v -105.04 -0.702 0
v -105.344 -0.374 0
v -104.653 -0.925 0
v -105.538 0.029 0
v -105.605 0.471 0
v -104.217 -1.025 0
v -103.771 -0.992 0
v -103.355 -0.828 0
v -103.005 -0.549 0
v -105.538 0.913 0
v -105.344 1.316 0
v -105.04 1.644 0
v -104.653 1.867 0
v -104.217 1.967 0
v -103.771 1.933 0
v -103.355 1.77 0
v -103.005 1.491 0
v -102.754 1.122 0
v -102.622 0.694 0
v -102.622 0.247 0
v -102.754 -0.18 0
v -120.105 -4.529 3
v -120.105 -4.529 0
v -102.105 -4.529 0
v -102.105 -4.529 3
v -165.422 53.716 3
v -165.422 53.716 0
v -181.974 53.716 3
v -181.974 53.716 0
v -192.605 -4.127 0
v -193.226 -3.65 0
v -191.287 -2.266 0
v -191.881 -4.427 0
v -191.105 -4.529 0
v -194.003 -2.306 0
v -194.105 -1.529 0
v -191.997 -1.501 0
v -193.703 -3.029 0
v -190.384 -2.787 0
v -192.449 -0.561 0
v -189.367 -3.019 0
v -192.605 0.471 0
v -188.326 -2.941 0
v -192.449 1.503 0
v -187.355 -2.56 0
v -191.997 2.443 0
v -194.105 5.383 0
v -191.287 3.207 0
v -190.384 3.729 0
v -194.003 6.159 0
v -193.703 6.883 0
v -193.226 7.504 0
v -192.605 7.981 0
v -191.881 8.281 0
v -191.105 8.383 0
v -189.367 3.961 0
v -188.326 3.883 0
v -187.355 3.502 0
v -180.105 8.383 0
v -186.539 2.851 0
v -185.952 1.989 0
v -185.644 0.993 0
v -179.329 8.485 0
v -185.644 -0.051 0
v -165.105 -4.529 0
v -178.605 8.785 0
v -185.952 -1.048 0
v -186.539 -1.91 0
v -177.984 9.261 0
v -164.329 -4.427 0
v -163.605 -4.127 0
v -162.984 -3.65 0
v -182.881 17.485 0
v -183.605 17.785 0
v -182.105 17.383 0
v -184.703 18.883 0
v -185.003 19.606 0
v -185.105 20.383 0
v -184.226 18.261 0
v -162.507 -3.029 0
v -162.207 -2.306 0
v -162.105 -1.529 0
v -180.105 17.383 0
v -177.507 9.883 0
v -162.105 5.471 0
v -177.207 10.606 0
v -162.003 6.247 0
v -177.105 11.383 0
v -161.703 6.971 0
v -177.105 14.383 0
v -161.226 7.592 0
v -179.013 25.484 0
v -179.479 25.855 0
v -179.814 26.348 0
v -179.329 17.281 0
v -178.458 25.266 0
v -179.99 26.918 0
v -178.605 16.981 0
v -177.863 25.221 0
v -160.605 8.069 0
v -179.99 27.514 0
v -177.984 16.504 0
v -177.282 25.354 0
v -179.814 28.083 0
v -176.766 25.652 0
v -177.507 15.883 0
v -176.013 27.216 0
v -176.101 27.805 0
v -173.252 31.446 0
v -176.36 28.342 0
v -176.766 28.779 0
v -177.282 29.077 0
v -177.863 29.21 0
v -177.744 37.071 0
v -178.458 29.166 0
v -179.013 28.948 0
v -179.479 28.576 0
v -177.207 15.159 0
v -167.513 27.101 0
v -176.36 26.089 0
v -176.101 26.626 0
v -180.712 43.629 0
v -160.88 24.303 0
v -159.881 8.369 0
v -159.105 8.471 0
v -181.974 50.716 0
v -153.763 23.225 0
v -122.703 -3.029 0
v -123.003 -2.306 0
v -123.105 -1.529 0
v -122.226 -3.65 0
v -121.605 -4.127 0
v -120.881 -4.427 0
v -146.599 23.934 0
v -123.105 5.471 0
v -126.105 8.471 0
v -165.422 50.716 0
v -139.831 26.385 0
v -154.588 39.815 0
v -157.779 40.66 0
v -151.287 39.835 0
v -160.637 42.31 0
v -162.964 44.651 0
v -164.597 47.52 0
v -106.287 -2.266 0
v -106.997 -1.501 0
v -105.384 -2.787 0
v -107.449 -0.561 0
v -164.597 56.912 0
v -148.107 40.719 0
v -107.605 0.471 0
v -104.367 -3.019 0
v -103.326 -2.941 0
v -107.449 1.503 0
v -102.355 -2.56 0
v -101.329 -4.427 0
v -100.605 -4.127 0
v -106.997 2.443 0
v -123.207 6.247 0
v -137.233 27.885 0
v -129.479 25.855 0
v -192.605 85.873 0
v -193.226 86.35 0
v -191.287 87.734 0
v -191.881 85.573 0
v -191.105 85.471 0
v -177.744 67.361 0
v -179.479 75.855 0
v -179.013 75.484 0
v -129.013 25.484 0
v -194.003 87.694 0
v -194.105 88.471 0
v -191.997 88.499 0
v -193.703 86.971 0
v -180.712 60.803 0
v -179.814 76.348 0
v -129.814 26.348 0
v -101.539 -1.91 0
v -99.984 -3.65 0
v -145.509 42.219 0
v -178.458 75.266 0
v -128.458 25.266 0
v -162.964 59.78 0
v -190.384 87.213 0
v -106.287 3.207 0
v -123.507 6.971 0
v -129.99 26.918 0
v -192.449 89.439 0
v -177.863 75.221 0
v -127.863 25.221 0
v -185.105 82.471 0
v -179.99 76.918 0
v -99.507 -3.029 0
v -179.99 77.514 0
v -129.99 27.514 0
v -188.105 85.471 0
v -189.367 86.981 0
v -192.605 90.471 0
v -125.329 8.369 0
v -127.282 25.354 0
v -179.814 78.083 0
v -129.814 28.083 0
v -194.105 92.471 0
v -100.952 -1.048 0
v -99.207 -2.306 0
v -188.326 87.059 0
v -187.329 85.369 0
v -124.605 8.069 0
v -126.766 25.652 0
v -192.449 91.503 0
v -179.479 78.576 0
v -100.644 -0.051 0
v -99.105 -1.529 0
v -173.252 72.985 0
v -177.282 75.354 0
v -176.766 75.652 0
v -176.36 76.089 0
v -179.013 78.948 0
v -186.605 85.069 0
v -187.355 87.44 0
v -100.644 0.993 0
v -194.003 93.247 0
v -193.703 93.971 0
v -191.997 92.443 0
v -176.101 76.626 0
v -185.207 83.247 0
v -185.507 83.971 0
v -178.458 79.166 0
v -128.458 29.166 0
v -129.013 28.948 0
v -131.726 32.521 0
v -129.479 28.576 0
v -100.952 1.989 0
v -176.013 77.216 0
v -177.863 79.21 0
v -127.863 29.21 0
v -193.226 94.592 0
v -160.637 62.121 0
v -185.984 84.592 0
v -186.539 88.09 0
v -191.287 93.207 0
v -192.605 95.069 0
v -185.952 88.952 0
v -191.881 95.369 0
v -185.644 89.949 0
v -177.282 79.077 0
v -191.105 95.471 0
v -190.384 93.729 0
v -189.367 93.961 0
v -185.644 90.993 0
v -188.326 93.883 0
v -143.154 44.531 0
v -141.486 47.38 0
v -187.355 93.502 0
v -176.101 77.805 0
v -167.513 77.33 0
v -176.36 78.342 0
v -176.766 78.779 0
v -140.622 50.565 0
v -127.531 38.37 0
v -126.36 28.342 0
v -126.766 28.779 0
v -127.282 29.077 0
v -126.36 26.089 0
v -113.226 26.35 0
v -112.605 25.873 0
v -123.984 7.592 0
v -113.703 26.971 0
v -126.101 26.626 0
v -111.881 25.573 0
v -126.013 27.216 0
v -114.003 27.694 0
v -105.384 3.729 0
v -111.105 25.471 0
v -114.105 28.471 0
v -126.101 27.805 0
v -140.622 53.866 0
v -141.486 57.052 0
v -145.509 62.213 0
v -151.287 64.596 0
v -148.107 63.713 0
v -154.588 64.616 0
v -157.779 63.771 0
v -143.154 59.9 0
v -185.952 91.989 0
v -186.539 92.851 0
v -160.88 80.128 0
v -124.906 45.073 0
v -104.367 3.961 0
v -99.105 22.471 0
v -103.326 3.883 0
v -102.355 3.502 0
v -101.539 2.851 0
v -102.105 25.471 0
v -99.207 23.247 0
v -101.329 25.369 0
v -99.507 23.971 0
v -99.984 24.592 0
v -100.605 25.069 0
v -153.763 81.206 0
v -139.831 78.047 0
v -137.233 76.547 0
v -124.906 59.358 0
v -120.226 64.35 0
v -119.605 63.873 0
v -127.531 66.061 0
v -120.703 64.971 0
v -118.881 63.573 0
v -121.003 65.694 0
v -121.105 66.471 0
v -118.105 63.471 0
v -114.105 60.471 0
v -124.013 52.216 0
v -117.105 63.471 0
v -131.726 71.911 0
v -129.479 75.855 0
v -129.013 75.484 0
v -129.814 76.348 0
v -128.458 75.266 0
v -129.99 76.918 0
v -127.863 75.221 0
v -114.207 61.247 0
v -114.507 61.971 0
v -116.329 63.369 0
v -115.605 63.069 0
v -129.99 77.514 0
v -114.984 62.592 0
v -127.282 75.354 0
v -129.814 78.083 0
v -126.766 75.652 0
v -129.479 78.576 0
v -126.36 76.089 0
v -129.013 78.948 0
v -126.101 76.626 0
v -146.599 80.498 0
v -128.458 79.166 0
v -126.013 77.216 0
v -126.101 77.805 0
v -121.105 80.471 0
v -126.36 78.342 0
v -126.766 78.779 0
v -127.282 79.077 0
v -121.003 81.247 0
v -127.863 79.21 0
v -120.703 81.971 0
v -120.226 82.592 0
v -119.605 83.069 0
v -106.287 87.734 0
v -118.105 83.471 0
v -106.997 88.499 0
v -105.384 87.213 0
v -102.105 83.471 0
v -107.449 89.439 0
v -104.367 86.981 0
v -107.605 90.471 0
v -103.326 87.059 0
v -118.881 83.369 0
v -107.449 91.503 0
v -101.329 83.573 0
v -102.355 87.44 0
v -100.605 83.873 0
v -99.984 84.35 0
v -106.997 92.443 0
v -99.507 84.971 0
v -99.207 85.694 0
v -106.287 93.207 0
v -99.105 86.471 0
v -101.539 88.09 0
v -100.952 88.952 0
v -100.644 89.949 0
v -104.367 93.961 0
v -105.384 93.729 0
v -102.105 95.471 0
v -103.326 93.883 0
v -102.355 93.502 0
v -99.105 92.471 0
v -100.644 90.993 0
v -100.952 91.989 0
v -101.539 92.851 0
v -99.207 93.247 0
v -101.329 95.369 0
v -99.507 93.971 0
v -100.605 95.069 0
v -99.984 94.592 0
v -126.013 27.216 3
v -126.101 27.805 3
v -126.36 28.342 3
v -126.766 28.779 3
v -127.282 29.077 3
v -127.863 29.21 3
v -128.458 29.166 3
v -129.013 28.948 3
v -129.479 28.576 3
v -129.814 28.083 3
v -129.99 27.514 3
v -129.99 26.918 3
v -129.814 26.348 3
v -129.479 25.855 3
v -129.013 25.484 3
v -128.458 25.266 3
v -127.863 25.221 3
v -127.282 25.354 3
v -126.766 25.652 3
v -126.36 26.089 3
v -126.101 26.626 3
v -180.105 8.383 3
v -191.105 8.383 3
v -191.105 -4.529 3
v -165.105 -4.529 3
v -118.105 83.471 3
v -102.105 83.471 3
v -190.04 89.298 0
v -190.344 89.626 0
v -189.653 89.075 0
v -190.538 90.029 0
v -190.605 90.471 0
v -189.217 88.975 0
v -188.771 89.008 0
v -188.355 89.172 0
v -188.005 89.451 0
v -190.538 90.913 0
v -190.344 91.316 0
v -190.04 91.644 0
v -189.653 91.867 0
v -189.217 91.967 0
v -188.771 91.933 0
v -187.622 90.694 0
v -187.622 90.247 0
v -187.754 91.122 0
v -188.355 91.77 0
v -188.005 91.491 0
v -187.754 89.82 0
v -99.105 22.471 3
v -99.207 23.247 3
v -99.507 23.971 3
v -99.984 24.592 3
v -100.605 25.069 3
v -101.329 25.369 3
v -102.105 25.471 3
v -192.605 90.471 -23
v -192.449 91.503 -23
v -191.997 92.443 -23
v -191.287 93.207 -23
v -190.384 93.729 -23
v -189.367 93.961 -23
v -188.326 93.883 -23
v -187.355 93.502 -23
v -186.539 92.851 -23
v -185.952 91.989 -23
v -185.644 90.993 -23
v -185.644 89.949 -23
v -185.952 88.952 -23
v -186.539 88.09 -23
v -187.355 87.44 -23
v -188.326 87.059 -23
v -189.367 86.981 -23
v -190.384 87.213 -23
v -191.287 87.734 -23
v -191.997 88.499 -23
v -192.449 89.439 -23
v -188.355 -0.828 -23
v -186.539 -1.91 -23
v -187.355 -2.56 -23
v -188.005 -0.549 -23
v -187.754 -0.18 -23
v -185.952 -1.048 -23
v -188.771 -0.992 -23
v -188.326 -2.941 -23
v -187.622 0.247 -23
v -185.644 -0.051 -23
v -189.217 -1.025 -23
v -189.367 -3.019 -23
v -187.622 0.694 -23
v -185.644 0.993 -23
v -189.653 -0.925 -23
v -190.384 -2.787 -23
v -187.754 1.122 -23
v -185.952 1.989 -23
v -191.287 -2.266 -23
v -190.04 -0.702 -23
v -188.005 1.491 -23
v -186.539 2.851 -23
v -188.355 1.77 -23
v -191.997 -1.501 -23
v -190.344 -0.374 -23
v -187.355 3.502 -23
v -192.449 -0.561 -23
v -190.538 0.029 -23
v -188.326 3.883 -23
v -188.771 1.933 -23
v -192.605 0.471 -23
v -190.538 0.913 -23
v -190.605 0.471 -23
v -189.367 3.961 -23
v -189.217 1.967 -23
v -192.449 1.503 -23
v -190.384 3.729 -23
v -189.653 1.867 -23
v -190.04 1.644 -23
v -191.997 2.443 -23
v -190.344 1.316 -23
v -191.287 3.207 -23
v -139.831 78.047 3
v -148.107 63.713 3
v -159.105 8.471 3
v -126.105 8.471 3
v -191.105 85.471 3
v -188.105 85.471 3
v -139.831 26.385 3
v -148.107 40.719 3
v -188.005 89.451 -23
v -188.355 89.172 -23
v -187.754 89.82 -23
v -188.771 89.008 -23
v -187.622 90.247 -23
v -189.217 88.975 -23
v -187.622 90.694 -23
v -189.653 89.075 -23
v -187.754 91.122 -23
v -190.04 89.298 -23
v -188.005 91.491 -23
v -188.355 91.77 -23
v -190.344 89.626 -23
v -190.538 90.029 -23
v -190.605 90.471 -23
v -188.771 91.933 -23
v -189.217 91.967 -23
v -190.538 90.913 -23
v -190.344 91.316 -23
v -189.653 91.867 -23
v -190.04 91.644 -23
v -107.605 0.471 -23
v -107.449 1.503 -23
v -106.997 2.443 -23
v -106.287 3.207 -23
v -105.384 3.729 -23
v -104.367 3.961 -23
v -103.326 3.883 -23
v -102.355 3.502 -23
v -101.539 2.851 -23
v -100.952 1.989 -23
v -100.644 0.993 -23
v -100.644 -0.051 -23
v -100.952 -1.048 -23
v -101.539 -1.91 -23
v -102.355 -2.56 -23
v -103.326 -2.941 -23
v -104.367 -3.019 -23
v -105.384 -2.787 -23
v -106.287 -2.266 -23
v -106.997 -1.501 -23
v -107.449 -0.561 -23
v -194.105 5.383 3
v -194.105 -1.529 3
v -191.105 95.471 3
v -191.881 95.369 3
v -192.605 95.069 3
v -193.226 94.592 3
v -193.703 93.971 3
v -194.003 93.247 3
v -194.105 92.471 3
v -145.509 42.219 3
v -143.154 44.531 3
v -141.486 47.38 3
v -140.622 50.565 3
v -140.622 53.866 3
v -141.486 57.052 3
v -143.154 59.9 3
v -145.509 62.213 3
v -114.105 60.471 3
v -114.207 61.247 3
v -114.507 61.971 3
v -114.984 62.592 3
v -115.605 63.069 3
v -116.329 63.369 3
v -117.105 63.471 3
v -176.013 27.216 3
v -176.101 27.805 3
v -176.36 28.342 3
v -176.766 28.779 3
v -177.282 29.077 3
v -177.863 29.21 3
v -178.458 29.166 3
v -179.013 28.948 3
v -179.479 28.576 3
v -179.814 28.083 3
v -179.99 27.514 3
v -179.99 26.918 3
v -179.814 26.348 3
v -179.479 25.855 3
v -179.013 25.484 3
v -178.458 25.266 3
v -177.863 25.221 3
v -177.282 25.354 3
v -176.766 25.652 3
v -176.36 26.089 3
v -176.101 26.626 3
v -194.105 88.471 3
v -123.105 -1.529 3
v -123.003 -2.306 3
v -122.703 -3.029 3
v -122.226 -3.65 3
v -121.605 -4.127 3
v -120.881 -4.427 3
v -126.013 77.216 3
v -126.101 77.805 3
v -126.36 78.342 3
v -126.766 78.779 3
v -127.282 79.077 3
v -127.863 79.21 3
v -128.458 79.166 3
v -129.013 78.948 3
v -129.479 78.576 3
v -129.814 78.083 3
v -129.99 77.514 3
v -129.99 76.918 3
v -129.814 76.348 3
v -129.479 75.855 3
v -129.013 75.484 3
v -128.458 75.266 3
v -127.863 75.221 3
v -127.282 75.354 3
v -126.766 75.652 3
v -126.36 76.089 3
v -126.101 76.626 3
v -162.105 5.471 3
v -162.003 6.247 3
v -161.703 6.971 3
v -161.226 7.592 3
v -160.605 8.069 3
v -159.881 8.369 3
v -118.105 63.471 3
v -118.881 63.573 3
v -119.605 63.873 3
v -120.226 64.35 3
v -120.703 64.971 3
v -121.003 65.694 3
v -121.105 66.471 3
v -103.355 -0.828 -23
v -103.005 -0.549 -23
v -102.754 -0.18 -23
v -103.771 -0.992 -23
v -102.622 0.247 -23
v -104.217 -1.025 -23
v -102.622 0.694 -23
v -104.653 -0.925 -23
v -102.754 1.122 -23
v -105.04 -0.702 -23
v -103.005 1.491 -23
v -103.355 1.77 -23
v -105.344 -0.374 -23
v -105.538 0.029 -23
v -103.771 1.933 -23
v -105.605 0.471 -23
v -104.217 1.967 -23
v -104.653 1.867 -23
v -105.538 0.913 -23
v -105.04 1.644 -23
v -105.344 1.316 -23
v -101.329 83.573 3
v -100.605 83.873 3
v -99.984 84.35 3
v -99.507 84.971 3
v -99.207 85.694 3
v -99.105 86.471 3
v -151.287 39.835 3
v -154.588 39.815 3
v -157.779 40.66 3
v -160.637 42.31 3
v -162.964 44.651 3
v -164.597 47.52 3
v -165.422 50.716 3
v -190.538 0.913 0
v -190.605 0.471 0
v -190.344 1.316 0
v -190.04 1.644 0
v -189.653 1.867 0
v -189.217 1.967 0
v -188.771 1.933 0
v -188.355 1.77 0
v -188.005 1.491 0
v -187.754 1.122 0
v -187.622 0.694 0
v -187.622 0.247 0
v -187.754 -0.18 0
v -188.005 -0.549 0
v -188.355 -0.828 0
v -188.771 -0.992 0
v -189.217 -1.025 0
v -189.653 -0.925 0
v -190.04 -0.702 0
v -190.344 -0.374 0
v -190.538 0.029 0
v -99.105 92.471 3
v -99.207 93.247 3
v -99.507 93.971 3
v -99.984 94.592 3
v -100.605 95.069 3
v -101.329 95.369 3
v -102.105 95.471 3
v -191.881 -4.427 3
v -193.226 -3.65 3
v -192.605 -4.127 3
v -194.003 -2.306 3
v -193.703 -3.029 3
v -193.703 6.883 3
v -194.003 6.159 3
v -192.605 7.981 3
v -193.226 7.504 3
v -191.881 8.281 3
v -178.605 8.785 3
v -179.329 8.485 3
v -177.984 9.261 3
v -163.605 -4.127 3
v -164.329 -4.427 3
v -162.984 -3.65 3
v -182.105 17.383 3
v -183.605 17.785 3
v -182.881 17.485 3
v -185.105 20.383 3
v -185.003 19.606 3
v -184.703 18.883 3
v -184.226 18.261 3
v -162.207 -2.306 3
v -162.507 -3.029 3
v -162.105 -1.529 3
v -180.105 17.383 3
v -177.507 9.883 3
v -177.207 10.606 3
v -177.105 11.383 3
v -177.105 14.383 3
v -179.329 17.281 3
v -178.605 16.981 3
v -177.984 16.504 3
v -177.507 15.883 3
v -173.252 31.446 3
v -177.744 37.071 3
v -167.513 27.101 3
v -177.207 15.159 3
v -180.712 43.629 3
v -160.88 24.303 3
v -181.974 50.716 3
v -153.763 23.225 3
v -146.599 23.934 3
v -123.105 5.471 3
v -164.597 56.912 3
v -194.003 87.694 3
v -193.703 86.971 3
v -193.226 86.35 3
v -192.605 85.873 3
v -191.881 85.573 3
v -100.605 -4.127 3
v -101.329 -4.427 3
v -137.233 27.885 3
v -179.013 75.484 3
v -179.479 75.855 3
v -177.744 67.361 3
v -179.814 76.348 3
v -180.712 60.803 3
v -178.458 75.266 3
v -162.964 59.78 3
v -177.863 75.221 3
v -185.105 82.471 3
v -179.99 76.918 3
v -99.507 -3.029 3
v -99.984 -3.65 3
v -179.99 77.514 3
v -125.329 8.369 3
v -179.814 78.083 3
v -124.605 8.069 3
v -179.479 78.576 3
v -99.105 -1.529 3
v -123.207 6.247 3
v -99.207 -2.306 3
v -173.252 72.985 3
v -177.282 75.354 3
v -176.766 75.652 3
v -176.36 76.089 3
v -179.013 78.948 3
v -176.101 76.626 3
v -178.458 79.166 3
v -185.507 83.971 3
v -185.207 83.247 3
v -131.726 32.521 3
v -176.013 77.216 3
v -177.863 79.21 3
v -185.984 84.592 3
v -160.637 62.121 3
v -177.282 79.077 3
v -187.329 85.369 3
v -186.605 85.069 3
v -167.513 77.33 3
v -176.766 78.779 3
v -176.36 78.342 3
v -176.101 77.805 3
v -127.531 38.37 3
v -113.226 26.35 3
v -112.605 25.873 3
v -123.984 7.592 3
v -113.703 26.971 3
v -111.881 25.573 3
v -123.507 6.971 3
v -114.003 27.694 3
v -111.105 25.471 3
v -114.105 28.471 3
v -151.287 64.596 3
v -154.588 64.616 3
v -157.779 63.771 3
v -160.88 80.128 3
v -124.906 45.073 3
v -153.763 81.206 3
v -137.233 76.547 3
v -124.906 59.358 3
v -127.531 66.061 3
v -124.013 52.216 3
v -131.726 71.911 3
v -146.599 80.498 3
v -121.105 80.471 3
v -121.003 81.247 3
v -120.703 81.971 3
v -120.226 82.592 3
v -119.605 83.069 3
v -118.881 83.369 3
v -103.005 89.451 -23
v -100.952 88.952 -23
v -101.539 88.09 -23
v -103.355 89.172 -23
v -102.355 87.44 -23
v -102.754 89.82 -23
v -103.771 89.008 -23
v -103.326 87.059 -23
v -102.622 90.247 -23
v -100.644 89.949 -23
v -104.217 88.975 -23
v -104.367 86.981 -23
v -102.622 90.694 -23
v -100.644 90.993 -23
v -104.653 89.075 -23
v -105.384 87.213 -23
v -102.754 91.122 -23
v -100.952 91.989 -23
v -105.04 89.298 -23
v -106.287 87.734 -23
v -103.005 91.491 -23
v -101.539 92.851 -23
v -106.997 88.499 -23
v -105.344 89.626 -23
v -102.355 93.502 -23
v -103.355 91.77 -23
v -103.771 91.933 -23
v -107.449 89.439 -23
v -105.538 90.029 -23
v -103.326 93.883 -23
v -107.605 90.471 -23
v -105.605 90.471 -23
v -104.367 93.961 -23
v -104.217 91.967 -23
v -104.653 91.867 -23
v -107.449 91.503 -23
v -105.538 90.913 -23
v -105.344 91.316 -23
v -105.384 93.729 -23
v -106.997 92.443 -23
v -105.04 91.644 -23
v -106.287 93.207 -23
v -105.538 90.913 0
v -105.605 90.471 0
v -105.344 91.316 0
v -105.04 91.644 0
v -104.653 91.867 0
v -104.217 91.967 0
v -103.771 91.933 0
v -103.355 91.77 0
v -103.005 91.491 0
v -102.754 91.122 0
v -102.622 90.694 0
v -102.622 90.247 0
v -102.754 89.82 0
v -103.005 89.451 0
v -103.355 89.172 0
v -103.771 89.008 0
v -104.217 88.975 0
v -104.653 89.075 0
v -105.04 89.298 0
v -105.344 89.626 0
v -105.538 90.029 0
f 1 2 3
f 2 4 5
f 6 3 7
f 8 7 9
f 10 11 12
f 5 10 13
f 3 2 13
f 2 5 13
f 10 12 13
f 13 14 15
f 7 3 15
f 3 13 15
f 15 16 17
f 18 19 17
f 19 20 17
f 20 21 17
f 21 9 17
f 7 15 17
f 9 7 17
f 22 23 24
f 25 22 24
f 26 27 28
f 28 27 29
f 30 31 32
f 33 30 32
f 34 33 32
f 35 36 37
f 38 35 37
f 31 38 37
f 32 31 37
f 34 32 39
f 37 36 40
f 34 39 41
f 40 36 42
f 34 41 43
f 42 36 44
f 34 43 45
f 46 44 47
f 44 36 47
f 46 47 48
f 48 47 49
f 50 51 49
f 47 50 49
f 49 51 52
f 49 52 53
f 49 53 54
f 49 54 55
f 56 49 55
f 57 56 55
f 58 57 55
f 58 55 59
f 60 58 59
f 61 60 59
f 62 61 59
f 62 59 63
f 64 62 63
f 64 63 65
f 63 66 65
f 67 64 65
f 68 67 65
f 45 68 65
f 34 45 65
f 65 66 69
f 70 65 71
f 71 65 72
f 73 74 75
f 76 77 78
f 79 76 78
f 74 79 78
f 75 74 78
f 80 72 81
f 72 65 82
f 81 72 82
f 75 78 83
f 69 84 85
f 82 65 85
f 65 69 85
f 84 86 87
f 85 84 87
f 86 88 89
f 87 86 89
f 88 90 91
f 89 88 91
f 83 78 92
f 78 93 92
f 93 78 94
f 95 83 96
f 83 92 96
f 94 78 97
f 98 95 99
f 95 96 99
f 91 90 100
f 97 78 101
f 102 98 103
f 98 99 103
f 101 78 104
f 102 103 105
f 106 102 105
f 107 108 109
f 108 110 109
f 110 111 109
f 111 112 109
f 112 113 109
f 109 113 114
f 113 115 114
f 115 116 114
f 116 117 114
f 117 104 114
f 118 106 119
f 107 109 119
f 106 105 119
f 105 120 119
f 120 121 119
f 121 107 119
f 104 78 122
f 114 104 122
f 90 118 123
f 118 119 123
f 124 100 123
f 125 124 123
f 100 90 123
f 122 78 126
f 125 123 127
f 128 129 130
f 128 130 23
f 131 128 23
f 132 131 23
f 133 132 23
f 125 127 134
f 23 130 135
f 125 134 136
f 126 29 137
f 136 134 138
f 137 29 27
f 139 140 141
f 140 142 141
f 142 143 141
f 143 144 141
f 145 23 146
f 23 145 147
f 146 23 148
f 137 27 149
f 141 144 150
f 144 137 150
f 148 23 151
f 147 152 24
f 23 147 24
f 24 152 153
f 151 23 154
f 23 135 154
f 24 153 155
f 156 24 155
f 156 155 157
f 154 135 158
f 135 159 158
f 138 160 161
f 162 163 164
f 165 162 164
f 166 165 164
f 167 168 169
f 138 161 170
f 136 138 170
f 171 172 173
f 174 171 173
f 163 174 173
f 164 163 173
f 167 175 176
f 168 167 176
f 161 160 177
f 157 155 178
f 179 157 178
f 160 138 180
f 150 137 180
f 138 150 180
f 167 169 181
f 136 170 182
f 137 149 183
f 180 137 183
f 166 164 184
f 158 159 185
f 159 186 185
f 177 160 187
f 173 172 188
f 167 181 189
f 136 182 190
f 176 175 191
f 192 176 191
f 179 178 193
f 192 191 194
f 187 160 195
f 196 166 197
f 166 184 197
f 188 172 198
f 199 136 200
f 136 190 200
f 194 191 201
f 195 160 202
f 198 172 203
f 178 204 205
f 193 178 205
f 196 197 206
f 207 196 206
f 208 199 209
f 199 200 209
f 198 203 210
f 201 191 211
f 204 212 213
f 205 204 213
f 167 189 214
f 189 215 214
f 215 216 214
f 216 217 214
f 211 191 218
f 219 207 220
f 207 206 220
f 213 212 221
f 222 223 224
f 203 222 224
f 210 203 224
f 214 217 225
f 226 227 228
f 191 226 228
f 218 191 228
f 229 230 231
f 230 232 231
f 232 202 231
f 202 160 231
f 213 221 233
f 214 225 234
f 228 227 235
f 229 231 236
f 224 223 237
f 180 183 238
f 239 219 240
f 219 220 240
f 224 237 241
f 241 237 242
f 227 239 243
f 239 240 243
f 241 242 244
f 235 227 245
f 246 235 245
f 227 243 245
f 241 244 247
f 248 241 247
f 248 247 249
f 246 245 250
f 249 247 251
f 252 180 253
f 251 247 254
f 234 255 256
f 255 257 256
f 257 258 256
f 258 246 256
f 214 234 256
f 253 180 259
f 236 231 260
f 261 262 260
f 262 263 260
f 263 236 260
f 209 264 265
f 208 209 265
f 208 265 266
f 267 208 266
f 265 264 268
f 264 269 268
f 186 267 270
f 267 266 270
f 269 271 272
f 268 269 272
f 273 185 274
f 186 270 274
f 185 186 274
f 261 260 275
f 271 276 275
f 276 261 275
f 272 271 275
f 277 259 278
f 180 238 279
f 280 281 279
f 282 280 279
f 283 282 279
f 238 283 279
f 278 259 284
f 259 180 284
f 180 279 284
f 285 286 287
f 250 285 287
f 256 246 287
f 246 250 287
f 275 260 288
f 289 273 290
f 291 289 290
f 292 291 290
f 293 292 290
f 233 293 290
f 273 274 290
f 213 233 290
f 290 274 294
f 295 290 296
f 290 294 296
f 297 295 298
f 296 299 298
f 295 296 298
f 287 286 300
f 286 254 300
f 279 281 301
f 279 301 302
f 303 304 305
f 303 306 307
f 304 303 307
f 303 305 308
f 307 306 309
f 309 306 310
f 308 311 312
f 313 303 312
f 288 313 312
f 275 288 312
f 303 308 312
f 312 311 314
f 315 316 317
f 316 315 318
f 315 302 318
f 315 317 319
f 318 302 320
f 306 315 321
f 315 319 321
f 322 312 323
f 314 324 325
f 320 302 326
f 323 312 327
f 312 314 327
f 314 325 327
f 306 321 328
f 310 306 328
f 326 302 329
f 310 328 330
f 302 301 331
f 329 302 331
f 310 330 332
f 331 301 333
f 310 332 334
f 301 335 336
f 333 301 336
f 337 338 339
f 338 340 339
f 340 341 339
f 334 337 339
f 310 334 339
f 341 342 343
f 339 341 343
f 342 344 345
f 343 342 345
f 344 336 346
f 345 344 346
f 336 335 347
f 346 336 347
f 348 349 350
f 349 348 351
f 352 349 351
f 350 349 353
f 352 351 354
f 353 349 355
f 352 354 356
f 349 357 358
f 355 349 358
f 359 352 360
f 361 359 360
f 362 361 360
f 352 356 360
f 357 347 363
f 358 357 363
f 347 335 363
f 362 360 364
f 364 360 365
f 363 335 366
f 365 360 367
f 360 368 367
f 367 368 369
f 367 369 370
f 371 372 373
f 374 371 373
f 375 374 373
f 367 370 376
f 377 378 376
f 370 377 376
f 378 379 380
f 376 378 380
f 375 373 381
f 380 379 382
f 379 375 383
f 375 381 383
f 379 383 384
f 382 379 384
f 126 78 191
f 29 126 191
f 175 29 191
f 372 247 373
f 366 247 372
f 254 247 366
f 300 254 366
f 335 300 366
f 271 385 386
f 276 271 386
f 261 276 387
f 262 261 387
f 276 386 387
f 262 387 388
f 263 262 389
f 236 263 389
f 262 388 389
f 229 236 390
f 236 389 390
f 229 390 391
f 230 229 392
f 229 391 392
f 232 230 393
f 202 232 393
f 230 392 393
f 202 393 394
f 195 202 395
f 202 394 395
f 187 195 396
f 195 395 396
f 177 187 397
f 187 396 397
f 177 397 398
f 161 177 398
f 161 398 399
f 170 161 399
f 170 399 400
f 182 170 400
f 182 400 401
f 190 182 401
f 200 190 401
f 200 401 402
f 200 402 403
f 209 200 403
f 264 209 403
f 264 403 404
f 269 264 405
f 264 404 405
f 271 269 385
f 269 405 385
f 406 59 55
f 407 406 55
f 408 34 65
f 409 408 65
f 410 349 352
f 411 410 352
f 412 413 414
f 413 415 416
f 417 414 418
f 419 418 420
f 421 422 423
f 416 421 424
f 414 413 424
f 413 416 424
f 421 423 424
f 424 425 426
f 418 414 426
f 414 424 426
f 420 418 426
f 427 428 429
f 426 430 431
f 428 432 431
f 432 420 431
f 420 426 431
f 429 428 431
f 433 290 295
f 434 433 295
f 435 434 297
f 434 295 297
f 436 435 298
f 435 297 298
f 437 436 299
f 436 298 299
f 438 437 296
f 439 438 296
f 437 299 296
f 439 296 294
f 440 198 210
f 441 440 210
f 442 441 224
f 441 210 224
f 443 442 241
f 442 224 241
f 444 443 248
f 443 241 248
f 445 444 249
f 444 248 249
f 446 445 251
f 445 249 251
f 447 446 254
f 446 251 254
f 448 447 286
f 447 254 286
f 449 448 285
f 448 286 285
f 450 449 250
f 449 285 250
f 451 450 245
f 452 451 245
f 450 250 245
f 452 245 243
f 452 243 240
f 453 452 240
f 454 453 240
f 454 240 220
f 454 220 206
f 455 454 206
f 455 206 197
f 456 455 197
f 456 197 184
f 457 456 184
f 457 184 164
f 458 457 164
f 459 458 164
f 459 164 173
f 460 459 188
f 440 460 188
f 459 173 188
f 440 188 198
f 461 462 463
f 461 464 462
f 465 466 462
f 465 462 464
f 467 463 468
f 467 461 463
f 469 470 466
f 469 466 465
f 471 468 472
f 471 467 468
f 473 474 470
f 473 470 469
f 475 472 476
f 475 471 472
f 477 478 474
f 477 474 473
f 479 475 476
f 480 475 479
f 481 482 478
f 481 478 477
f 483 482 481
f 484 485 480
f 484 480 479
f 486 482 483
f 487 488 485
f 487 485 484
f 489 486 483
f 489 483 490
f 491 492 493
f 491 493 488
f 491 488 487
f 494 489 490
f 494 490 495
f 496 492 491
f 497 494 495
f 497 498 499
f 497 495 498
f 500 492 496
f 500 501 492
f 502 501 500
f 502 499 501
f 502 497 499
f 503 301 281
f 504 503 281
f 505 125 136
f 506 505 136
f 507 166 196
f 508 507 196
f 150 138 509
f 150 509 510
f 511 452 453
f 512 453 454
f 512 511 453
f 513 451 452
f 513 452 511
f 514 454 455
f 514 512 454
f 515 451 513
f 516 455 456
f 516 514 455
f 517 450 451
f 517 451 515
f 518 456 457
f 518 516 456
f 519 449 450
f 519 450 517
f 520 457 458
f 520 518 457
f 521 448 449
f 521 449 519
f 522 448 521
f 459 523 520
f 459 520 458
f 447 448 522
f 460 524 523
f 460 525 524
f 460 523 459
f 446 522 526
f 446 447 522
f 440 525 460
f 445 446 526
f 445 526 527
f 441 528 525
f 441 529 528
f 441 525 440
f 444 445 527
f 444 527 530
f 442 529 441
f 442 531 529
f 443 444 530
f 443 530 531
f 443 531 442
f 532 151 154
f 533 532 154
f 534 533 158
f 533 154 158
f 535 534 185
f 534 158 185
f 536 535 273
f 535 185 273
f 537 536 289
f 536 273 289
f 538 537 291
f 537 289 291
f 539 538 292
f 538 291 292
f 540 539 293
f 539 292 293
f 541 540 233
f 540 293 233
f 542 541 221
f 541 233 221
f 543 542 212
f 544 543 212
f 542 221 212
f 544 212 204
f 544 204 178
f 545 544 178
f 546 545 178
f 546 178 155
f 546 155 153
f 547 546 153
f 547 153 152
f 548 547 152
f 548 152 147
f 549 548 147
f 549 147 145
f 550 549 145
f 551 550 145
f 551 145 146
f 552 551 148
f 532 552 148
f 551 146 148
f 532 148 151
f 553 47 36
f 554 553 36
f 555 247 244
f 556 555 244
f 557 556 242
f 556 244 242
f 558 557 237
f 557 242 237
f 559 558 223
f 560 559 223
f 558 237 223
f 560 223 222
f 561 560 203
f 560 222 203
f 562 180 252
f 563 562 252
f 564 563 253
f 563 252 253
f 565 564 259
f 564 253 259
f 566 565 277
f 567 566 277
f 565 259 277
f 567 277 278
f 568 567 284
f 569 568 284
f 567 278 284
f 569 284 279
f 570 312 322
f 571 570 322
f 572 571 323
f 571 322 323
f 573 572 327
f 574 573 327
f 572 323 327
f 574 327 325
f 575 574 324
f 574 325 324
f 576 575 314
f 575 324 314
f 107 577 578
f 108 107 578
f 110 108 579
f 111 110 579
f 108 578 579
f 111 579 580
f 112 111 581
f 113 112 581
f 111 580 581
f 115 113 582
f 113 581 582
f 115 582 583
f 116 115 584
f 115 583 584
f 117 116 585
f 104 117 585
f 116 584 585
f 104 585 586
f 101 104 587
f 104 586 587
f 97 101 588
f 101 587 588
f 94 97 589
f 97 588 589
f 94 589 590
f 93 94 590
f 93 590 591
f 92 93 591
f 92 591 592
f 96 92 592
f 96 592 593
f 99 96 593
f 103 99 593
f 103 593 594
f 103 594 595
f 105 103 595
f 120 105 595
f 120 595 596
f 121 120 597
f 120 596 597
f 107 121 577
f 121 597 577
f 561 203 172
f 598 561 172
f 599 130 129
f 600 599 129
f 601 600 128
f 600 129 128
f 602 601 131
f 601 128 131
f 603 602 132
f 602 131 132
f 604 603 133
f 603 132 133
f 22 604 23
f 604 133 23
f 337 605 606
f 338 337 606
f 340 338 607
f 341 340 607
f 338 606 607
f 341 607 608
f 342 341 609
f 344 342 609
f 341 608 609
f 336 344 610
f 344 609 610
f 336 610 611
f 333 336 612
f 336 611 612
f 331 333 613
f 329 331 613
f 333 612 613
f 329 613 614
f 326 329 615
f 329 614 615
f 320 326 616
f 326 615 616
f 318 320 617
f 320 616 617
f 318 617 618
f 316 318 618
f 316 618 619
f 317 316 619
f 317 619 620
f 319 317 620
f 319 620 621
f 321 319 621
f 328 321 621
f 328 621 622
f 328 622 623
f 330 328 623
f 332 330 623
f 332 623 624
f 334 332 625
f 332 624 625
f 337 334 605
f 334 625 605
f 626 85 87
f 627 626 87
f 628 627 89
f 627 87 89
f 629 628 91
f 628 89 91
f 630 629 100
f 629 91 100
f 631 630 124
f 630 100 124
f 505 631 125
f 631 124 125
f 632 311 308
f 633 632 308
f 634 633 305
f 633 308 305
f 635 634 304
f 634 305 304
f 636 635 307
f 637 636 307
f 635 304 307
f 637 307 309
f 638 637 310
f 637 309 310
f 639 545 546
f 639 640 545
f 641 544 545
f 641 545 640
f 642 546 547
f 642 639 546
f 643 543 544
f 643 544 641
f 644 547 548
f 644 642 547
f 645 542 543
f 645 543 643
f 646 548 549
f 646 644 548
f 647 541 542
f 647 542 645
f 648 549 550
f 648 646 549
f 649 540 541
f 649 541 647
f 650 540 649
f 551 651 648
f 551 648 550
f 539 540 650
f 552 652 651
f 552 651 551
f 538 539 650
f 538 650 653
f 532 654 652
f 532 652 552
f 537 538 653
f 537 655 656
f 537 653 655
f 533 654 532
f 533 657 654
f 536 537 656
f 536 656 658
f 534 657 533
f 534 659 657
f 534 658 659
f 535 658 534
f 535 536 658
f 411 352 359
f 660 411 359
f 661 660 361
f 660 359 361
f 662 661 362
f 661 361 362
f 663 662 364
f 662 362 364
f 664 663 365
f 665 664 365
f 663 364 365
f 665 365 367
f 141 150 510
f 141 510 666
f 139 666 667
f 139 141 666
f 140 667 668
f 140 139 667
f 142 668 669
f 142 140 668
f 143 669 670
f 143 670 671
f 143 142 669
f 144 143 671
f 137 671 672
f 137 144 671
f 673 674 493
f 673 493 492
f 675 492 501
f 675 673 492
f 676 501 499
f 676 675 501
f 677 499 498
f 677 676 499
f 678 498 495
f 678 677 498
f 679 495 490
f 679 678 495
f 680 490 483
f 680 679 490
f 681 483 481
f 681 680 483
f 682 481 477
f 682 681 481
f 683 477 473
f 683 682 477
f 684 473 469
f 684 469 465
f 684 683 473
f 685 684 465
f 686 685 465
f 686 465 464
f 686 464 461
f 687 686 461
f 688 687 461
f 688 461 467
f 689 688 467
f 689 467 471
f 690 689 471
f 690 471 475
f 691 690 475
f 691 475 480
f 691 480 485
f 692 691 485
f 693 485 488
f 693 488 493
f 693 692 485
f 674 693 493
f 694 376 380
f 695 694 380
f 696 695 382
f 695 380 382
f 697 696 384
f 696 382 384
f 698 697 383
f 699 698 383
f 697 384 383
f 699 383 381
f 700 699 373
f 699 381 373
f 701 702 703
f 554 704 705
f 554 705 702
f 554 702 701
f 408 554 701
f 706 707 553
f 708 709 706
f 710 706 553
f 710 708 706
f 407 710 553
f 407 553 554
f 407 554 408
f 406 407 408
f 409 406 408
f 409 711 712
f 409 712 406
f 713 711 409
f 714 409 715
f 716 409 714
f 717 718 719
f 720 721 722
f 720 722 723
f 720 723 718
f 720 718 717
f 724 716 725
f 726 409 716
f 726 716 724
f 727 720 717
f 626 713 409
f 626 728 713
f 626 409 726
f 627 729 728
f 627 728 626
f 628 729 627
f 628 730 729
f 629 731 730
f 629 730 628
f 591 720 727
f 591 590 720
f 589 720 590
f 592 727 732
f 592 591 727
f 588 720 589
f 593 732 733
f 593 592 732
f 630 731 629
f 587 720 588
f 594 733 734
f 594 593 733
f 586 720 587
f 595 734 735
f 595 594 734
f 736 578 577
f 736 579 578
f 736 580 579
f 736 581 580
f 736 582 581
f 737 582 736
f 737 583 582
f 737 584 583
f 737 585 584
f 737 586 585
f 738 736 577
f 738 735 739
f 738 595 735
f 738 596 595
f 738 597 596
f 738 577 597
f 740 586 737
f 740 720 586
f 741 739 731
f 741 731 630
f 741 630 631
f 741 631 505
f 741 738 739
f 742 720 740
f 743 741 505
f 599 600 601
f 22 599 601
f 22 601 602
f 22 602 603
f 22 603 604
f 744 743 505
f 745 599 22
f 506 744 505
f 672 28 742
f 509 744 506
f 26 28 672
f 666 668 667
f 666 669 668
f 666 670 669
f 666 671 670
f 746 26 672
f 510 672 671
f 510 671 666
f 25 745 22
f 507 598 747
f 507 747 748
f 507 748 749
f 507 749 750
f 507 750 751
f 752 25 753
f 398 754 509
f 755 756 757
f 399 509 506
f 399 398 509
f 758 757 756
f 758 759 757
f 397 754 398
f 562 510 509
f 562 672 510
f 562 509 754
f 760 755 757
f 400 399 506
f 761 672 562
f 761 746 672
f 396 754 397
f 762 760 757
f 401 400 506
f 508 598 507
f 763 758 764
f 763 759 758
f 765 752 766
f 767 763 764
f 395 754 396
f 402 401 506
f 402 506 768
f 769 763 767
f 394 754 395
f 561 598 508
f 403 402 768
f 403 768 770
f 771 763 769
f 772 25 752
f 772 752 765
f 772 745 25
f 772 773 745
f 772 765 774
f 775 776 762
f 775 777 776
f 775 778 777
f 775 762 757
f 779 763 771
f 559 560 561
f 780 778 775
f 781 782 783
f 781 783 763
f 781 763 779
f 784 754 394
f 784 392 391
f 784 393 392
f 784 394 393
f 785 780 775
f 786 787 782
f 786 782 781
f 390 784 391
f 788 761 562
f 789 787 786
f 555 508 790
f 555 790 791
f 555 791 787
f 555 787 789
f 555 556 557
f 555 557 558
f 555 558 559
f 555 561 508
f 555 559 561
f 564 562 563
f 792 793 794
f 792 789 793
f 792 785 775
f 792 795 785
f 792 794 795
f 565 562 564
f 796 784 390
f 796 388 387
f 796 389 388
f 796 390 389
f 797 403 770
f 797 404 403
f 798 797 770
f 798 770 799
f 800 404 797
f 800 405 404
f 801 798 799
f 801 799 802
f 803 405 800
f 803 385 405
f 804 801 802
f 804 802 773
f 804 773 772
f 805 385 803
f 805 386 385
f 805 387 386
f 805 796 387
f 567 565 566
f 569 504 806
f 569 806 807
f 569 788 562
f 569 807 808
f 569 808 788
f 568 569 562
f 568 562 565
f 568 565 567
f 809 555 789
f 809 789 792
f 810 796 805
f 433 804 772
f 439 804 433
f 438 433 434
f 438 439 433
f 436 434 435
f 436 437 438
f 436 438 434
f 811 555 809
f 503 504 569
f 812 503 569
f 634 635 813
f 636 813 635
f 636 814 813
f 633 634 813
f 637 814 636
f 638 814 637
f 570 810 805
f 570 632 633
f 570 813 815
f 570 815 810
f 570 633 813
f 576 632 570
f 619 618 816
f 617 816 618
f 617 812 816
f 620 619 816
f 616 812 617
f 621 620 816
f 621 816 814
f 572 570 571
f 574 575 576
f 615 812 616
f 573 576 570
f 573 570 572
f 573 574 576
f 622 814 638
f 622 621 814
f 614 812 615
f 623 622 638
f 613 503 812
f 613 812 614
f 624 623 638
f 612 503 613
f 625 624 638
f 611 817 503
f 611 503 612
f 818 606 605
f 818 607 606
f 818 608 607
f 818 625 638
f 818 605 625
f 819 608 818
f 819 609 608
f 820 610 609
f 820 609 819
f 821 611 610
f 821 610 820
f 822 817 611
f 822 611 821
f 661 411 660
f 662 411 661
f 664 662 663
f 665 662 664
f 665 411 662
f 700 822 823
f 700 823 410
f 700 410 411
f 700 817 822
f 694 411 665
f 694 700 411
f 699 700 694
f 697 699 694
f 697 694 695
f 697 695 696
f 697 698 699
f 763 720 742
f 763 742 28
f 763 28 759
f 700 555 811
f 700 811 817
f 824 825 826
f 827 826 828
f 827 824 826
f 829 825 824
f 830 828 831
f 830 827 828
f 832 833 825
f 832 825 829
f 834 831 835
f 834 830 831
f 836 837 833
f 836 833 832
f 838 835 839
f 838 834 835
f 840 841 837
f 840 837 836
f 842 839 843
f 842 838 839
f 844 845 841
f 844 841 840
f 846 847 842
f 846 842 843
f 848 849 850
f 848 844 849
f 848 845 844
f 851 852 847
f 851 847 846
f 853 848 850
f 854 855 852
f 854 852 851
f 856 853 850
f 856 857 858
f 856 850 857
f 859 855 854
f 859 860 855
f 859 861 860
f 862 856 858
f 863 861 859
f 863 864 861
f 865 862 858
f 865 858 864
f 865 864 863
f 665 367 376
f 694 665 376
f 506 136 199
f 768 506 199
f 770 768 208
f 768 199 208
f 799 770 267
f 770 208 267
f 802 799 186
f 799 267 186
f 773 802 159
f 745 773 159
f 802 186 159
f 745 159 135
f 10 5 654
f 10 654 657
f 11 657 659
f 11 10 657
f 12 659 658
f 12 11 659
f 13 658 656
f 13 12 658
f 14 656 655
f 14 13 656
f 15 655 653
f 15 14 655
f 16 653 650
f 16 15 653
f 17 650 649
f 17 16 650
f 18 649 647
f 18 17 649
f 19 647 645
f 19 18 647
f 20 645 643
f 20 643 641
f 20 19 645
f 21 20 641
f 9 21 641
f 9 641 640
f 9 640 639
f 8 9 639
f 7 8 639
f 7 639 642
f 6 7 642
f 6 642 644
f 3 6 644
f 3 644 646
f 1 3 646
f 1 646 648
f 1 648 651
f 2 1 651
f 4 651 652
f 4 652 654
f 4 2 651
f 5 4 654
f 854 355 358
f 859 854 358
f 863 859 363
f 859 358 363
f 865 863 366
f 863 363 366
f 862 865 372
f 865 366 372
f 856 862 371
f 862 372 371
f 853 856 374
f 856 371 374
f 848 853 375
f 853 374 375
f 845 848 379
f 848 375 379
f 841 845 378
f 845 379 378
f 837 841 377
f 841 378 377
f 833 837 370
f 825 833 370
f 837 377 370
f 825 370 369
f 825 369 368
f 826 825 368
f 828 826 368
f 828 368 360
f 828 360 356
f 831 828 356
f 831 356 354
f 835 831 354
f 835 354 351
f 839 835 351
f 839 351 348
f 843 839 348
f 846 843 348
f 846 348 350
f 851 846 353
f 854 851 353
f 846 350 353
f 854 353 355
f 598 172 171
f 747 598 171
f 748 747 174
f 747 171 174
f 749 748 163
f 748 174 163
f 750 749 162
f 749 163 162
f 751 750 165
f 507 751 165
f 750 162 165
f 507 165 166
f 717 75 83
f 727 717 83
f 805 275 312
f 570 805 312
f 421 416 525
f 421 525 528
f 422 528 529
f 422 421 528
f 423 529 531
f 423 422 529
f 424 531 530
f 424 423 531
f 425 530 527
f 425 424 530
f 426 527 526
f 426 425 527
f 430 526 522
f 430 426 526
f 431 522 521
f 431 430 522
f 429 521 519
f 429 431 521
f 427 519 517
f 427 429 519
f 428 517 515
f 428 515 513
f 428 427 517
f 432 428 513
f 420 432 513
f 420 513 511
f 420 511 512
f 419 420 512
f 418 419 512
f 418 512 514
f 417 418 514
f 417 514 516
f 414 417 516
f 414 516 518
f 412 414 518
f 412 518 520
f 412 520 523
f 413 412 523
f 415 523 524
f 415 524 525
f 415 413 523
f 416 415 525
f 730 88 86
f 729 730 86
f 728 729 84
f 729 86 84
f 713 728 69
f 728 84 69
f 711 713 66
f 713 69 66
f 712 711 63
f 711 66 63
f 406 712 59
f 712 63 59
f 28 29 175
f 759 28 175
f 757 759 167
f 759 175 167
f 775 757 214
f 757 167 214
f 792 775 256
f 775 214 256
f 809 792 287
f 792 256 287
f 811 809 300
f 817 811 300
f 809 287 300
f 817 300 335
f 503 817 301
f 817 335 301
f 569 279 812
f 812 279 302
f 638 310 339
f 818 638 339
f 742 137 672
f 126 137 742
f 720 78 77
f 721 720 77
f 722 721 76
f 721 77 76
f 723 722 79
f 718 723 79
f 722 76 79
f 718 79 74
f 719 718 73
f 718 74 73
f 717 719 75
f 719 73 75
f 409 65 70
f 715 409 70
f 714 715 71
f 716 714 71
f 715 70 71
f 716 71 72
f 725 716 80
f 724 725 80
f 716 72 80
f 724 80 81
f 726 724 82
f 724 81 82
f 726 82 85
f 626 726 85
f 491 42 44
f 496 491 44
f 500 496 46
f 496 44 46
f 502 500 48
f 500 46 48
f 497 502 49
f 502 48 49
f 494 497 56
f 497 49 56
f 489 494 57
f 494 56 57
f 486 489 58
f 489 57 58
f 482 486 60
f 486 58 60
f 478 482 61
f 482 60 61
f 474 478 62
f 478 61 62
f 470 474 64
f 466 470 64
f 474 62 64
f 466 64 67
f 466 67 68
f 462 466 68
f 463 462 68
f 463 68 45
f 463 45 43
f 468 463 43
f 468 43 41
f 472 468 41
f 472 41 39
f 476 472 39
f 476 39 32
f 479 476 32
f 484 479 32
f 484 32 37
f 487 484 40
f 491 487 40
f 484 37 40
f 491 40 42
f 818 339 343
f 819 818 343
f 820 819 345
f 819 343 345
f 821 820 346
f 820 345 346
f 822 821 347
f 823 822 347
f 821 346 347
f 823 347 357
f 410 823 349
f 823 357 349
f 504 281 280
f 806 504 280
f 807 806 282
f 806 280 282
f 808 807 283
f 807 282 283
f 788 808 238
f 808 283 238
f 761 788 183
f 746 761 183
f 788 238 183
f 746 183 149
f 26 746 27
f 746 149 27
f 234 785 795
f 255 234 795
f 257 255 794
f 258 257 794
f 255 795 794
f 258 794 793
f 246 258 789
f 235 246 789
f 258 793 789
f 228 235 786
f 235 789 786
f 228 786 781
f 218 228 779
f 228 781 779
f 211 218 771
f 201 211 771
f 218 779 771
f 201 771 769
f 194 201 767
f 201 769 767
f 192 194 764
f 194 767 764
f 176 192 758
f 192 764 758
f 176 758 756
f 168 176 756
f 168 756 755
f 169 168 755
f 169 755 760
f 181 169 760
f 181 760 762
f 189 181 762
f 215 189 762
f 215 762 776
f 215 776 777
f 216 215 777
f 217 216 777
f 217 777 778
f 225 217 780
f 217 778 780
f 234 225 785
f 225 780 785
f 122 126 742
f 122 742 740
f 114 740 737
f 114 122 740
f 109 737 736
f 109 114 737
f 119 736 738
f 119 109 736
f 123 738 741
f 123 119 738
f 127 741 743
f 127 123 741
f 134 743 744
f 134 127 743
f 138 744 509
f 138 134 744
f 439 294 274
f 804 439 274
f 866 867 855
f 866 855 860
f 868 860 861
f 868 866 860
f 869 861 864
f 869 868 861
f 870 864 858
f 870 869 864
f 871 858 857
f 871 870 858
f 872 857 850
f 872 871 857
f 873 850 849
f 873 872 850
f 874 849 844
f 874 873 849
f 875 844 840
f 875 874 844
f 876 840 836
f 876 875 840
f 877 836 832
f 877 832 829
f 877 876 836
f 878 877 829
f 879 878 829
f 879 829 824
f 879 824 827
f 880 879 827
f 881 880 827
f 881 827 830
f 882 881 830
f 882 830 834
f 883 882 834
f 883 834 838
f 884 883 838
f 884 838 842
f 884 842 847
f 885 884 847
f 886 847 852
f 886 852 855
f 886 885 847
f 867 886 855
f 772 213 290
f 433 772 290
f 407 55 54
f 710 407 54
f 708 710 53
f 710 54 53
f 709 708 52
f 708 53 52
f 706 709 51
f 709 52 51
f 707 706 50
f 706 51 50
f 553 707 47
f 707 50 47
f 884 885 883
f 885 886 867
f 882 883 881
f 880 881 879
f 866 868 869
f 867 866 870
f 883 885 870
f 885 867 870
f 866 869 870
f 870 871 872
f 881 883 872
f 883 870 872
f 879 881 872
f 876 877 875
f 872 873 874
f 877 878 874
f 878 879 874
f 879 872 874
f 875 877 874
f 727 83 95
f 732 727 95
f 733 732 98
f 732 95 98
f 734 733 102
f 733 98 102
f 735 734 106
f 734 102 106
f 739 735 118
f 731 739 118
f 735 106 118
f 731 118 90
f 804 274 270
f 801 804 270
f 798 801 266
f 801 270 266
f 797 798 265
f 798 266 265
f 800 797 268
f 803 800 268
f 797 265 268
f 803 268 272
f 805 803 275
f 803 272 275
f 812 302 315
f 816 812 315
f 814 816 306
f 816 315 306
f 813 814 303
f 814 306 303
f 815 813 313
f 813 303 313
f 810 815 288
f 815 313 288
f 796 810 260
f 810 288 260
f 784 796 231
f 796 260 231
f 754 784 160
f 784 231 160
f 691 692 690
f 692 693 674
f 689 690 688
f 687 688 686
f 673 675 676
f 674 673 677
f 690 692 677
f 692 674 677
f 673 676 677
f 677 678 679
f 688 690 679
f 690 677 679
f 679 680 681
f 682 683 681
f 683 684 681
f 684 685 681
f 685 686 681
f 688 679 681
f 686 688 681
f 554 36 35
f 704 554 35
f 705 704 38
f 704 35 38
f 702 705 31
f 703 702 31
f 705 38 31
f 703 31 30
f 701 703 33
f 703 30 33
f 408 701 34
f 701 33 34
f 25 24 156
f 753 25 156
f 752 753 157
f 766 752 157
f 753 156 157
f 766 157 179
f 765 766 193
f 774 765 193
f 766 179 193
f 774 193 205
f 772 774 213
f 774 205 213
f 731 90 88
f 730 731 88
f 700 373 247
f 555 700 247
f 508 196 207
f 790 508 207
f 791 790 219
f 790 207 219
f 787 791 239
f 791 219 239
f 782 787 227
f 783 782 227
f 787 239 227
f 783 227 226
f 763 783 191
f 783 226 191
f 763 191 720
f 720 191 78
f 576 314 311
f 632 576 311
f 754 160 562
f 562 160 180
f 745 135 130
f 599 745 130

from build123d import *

# Parameters (mm, degrees)
SALIENTE_EXTRUIR1_DEPTH = 3
CROQUIS2_R              = 3.5
CROQUIS2_R_2            = 1.5
SALIENTE_EXTRUIR2_DEPTH = 23
CROQUIS3_R              = 2
CORTAR_EXTRUIR1_DEPTH   = 3


with BuildPart() as part:
    # Croquis1 → Saliente-Extruir1 (new body)
    with BuildSketch(Plane.XY):
        with BuildLine():
            Line((-194.10496046, 92.470884256), (-194.10496046, 88.470884256))
            ThreePointArc((-194.10496046, 88.470884256), (-193.226280804, 86.349563912), (-191.10496046, 85.470884256))
            Line((-191.10496046, 85.470884256), (-188.10496046, 85.470884256))
            ThreePointArc((-188.10496046, 85.470884256), (-185.983640117, 84.592204599), (-185.10496046, 82.470884256))
            Line((-185.10496046, 82.470884256), (-185.10496046, 20.382772077))
            ThreePointArc((-185.10496046, 20.382772077), (-184.226280804, 18.261451734), (-182.10496046, 17.382772077))
            Line((-182.10496046, 17.382772077), (-180.10496046, 17.382772077))
            ThreePointArc((-180.10496046, 17.382772077), (-177.983640117, 16.504092421), (-177.10496046, 14.382772077))
            Line((-177.10496046, 14.382772077), (-177.10496046, 11.382772077))
            ThreePointArc((-177.10496046, 11.382772077), (-177.983640117, 9.261451734), (-180.10496046, 8.382772077))
            Line((-180.10496046, 8.382772077), (-191.10496046, 8.382772077))
            ThreePointArc((-191.10496046, 8.382772077), (-193.226280804, 7.504092421), (-194.10496046, 5.382772077))
            Line((-194.10496046, 5.382772077), (-194.10496046, -1.529115744))
            ThreePointArc((-194.10496046, -1.529115744), (-193.226280804, -3.650436088), (-191.10496046, -4.529115744))
            Line((-191.10496046, -4.529115744), (-165.10496046, -4.529115744))
            ThreePointArc((-165.10496046, -4.529115744), (-162.983640117, -3.650436088), (-162.10496046, -1.529115744))
            Line((-162.10496046, -1.529115744), (-162.10496046, 5.470884256))
            ThreePointArc((-162.10496046, 5.470884256), (-161.226280804, 7.592204599), (-159.10496046, 8.470884256))
            Line((-159.10496046, 8.470884256), (-126.10496046, 8.470884256))
            ThreePointArc((-126.10496046, 8.470884256), (-123.983640117, 7.592204599), (-123.10496046, 5.470884256))
            Line((-123.10496046, 5.470884256), (-123.10496046, -1.529115744))
            ThreePointArc((-123.10496046, -1.529115744), (-122.226280804, -3.650436088), (-120.10496046, -4.529115744))
            Line((-120.10496046, -4.529115744), (-102.10496046, -4.529115744))
            ThreePointArc((-102.10496046, -4.529115744), (-99.983640117, -3.650436088), (-99.10496046, -1.529115744))
            Line((-99.10496046, -1.529115744), (-99.10496046, 22.470884256))
            ThreePointArc((-99.10496046, 22.470884256), (-99.983640117, 24.592204599), (-102.10496046, 25.470884256))
            Line((-102.10496046, 25.470884256), (-111.10496046, 25.470884256))
            ThreePointArc((-111.10496046, 25.470884256), (-113.226280804, 26.349563912), (-114.10496046, 28.470884256))
            Line((-114.10496046, 28.470884256), (-114.10496046, 60.470884256))
            ThreePointArc((-114.10496046, 60.470884256), (-114.983640117, 62.592204599), (-117.10496046, 63.470884256))
            Line((-117.10496046, 63.470884256), (-118.10496046, 63.470884256))
            ThreePointArc((-118.10496046, 63.470884256), (-120.226280804, 64.349563912), (-121.10496046, 66.470884256))
            Line((-121.10496046, 66.470884256), (-121.10496046, 80.470884256))
            ThreePointArc((-121.10496046, 80.470884256), (-120.226280804, 82.592204599), (-118.10496046, 83.470884256))
            Line((-118.10496046, 83.470884256), (-102.10496046, 83.470884256))
            ThreePointArc((-102.10496046, 83.470884256), (-99.983640117, 84.349563912), (-99.10496046, 86.470884256))
            Line((-99.10496046, 86.470884256), (-99.10496046, 92.470884256))
            ThreePointArc((-99.10496046, 92.470884256), (-99.983640117, 94.592204599), (-102.10496046, 95.470884256))
            Line((-102.10496046, 95.470884256), (-191.10496046, 95.470884256))
            ThreePointArc((-191.10496046, 95.470884256), (-193.226280804, 94.592204599), (-194.10496046, 92.470884256))
        make_face()
        with BuildLine():
            Line((-165.422187349, 50.715677144), (-181.973694619, 50.715677144))
            ThreePointArc((-181.973694619, 50.715677144), (-167.512513703, 27.100940434), (-139.830961352, 26.384558748))
            Line((-139.830961352, 26.384558748), (-148.106714986, 40.718584514))
            ThreePointArc((-148.106714986, 40.718584514), (-159.262513703, 41.390359596), (-165.422187349, 50.715677144))
        make_face(mode=Mode.SUBTRACT)
        with BuildLine():
            Line((-165.422187349, 53.715677144), (-181.973694619, 53.715677144))
            ThreePointArc((-181.973694619, 53.715677144), (-167.512513703, 77.330413853), (-139.830961352, 78.04679554))
            Line((-139.830961352, 78.04679554), (-148.106714986, 63.712769774))
            ThreePointArc((-148.106714986, 63.712769774), (-159.262513703, 63.040994691), (-165.422187349, 53.715677144))
        make_face(mode=Mode.SUBTRACT)
        with BuildLine():
            Line((-145.508638775, 62.212769774), (-137.23288514, 76.54679554))
            ThreePointArc((-137.23288514, 76.54679554), (-124.012513703, 52.215677144), (-137.23288514, 27.884558748))
            Line((-137.23288514, 27.884558748), (-145.508638775, 42.218584514))
            ThreePointArc((-145.508638775, 42.218584514), (-140.512513703, 52.215677144), (-145.508638775, 62.212769774))
        make_face(mode=Mode.SUBTRACT)
    extrude(amount=SALIENTE_EXTRUIR1_DEPTH)

    # Croquis2 → Saliente-Extruir2 (add)
    with BuildSketch(Plane(origin=(0, 0, 0), x_dir=(-1, 0, 0), z_dir=(0, 0, -1))):
        with Locations((189.10496046, 90.470884256)):
            Circle(CROQUIS2_R)
        with Locations((189.10496046, 90.470884256)):
            Circle(CROQUIS2_R_2, mode=Mode.SUBTRACT)
        with Locations((104.10496046, 90.470884256)):
            Circle(CROQUIS2_R)
        with Locations((104.10496046, 90.470884256)):
            Circle(CROQUIS2_R_2, mode=Mode.SUBTRACT)
        with Locations((104.10496046, 0.470884256)):
            Circle(CROQUIS2_R)
        with Locations((104.10496046, 0.470884256)):
            Circle(CROQUIS2_R_2, mode=Mode.SUBTRACT)
        with Locations((189.10496046, 0.470884256)):
            Circle(CROQUIS2_R)
        with Locations((189.10496046, 0.470884256)):
            Circle(CROQUIS2_R_2, mode=Mode.SUBTRACT)
    extrude(amount=SALIENTE_EXTRUIR2_DEPTH)

    # Croquis3 → Cortar-Extruir1 (cut)
    with BuildSketch(Plane.XY.offset(3)):
        with Locations((-178.012513703, 77.215677144)):
            Circle(CROQUIS3_R)
        with Locations((-128.012513703, 77.215677144)):
            Circle(CROQUIS3_R)
        with Locations((-128.012513703, 27.215677144)):
            Circle(CROQUIS3_R)
        with Locations((-178.012513703, 27.215677144)):
            Circle(CROQUIS3_R)
    extrude(amount=-CORTAR_EXTRUIR1_DEPTH, mode=Mode.SUBTRACT)


solid = part.part
